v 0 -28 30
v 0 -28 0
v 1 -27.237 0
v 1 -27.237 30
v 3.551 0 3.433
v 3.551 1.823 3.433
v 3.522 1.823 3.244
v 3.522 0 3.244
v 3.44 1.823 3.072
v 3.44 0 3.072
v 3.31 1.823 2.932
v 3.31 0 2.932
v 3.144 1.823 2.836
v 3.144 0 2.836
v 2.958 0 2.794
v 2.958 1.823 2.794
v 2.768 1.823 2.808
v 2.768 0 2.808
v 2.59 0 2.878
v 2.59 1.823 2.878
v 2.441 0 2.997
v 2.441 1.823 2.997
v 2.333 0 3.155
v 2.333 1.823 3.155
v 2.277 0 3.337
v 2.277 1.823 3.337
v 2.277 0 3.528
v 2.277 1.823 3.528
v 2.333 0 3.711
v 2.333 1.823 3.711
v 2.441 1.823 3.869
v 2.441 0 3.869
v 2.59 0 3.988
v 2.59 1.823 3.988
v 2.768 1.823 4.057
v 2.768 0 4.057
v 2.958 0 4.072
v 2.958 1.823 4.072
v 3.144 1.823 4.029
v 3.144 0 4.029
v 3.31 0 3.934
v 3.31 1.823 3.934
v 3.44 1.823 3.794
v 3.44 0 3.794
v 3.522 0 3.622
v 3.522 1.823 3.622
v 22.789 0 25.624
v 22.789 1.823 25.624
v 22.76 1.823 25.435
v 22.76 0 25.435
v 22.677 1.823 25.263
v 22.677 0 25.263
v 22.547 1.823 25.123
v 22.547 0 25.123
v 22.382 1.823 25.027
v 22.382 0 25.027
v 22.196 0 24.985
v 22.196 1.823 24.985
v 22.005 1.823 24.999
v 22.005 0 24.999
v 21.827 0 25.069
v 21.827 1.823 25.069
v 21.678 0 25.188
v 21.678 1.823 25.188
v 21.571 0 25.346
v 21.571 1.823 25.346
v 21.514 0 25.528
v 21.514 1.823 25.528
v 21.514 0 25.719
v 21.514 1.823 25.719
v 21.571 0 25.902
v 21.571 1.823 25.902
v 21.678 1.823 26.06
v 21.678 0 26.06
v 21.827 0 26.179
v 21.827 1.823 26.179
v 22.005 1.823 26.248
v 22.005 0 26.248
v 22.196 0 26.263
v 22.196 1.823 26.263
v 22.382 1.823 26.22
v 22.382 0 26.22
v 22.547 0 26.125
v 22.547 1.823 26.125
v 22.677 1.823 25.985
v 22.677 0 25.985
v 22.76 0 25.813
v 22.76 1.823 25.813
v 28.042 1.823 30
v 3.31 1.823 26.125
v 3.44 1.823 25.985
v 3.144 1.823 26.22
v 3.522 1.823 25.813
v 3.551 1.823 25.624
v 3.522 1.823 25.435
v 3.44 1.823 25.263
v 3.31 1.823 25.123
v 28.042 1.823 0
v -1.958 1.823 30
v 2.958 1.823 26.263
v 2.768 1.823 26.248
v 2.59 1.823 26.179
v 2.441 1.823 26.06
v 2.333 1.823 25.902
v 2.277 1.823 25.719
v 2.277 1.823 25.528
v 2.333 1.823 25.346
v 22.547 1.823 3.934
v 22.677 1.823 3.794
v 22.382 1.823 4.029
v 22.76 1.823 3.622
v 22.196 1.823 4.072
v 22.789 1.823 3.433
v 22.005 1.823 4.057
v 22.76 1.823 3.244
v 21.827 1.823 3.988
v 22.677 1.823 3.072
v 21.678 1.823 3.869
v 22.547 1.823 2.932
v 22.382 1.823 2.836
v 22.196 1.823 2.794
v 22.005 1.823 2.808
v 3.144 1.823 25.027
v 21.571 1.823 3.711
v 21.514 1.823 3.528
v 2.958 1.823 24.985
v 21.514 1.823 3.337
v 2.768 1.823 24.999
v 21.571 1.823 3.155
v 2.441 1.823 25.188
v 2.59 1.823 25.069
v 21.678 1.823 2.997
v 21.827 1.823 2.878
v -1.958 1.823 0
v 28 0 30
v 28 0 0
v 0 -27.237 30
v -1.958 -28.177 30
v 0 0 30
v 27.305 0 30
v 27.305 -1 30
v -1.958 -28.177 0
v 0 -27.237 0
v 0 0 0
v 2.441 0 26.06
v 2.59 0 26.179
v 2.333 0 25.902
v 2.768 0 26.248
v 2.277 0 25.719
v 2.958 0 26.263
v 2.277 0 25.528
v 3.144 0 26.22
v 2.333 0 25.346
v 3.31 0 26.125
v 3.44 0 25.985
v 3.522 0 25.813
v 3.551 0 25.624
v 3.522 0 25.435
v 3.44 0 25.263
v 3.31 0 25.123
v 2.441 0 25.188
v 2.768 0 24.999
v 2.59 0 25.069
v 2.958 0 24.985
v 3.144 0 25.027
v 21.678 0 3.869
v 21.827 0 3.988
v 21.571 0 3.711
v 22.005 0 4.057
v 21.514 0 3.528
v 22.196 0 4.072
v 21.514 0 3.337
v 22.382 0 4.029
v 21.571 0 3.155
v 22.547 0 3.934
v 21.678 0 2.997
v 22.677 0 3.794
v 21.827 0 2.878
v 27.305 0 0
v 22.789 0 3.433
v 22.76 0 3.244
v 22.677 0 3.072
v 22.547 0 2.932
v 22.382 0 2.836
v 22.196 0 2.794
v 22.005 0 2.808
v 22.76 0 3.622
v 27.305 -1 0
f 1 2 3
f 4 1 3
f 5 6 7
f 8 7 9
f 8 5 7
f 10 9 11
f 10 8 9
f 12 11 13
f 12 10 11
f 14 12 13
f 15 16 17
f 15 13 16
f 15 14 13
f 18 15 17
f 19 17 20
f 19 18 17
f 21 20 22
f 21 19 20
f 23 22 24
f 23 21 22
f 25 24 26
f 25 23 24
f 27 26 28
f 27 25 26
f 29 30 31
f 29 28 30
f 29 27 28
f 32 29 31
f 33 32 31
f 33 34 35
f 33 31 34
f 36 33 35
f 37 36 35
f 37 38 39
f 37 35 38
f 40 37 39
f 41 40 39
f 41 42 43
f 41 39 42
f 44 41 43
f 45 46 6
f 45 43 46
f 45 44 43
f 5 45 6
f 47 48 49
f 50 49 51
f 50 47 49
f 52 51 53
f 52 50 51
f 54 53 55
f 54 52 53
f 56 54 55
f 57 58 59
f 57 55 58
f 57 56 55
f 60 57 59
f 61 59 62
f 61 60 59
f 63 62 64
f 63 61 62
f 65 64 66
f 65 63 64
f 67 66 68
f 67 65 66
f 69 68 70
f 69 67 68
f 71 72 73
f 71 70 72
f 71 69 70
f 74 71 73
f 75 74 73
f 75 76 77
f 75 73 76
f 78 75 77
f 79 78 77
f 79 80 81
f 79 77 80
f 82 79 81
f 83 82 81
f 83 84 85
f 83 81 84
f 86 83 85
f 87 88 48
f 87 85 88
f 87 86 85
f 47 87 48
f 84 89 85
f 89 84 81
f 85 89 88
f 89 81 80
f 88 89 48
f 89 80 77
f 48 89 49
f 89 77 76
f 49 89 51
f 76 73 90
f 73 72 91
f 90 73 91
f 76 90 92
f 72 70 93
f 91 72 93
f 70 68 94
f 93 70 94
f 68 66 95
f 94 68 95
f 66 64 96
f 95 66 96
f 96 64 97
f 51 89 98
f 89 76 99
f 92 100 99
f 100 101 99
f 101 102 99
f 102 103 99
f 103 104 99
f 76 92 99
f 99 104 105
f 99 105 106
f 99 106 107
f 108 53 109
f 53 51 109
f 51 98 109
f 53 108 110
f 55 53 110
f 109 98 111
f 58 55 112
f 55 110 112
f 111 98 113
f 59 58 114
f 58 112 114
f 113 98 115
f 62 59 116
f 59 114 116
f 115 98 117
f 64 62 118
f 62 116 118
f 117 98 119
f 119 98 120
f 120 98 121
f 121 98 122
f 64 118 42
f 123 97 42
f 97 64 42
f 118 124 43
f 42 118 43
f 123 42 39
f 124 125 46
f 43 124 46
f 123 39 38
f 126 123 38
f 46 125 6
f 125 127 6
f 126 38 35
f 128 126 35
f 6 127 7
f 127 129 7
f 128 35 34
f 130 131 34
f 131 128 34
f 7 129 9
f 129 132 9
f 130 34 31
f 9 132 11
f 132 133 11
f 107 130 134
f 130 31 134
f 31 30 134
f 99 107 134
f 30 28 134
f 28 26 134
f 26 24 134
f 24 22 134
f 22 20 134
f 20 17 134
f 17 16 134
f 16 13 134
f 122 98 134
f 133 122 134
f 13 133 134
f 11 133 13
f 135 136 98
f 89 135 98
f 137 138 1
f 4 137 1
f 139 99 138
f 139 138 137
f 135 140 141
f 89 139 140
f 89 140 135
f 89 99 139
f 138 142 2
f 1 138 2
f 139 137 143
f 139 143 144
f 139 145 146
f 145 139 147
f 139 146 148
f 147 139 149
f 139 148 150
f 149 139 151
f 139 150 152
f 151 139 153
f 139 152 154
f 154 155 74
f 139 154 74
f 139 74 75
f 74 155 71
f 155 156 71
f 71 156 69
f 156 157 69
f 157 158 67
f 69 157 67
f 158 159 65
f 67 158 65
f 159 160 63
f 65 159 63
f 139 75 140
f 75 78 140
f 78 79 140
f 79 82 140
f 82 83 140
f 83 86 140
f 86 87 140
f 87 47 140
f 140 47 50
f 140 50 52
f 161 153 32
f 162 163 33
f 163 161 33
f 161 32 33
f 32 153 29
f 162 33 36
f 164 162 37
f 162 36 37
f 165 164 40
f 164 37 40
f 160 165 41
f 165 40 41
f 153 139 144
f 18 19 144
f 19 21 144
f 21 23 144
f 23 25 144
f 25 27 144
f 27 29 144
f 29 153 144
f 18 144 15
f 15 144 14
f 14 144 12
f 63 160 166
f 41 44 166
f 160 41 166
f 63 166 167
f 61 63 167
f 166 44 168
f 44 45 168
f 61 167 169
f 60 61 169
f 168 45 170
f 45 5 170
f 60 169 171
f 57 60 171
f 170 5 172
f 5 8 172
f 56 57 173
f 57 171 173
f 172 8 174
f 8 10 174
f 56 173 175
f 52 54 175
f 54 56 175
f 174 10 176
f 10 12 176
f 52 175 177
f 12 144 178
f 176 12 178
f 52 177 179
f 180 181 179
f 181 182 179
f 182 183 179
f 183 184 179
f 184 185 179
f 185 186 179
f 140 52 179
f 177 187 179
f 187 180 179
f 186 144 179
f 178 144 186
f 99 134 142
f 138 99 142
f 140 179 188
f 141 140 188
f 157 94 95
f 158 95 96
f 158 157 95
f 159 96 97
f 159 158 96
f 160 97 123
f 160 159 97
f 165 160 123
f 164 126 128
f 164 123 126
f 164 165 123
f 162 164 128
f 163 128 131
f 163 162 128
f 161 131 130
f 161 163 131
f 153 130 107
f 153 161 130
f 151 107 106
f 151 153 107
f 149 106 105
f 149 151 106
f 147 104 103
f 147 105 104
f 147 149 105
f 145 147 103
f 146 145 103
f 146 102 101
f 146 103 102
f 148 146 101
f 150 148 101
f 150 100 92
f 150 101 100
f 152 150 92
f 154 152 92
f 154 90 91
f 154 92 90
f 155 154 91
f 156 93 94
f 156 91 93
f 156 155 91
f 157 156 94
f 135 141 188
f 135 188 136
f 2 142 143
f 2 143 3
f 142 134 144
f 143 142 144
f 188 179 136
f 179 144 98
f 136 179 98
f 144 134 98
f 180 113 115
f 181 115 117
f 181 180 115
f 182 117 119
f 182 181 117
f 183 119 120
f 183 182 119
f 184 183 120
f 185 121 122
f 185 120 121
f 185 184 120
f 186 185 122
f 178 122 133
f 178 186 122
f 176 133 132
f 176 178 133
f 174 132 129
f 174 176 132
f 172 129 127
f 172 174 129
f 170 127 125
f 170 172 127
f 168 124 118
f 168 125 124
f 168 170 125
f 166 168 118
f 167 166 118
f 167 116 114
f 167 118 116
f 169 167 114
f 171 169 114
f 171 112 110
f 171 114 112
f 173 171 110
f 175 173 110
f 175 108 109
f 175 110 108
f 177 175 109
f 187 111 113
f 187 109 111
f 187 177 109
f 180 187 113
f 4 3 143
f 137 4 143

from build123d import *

# Parameters (mm, degrees)
EXTRUDE_1_DEPTH     = 30
SKETCH_2_R          = 0.64072886
CUT_EXTRUDE_2_DEPTH = 7


with BuildPart() as part:
    # 草图1 → 凸台-拉伸1 (new body)
    with BuildSketch(Plane.XY):
        Polygon((28.041755138, 1.822698956), (-1.958244862, 1.822698956), (-1.958244862, -28.177301044), (0, -28), (1, -27.237055845), (0, -27.237055845), (0, 0), (27.305301665, 0), (27.305301665, -1), (28, 0), align=None)
    extrude(amount=EXTRUDE_1_DEPTH)

    # 草图2 → 切除-拉伸2 (cut)
    with BuildSketch(Plane(origin=(0, 0, 0), x_dir=(1, 0, 0), z_dir=(0, 1, 0))):
        with Locations((2.910195006, -3.432793696)):
            Circle(SKETCH_2_R)
        with Locations((2.910195006, -25.623781676)):
            Circle(SKETCH_2_R)
        with Locations((22.147853718, -3.432793696)):
            Circle(SKETCH_2_R)
        with Locations((22.147853718, -25.623781676)):
            Circle(SKETCH_2_R)
    extrude(amount=CUT_EXTRUDE_2_DEPTH, mode=Mode.SUBTRACT)


solid = part.part
